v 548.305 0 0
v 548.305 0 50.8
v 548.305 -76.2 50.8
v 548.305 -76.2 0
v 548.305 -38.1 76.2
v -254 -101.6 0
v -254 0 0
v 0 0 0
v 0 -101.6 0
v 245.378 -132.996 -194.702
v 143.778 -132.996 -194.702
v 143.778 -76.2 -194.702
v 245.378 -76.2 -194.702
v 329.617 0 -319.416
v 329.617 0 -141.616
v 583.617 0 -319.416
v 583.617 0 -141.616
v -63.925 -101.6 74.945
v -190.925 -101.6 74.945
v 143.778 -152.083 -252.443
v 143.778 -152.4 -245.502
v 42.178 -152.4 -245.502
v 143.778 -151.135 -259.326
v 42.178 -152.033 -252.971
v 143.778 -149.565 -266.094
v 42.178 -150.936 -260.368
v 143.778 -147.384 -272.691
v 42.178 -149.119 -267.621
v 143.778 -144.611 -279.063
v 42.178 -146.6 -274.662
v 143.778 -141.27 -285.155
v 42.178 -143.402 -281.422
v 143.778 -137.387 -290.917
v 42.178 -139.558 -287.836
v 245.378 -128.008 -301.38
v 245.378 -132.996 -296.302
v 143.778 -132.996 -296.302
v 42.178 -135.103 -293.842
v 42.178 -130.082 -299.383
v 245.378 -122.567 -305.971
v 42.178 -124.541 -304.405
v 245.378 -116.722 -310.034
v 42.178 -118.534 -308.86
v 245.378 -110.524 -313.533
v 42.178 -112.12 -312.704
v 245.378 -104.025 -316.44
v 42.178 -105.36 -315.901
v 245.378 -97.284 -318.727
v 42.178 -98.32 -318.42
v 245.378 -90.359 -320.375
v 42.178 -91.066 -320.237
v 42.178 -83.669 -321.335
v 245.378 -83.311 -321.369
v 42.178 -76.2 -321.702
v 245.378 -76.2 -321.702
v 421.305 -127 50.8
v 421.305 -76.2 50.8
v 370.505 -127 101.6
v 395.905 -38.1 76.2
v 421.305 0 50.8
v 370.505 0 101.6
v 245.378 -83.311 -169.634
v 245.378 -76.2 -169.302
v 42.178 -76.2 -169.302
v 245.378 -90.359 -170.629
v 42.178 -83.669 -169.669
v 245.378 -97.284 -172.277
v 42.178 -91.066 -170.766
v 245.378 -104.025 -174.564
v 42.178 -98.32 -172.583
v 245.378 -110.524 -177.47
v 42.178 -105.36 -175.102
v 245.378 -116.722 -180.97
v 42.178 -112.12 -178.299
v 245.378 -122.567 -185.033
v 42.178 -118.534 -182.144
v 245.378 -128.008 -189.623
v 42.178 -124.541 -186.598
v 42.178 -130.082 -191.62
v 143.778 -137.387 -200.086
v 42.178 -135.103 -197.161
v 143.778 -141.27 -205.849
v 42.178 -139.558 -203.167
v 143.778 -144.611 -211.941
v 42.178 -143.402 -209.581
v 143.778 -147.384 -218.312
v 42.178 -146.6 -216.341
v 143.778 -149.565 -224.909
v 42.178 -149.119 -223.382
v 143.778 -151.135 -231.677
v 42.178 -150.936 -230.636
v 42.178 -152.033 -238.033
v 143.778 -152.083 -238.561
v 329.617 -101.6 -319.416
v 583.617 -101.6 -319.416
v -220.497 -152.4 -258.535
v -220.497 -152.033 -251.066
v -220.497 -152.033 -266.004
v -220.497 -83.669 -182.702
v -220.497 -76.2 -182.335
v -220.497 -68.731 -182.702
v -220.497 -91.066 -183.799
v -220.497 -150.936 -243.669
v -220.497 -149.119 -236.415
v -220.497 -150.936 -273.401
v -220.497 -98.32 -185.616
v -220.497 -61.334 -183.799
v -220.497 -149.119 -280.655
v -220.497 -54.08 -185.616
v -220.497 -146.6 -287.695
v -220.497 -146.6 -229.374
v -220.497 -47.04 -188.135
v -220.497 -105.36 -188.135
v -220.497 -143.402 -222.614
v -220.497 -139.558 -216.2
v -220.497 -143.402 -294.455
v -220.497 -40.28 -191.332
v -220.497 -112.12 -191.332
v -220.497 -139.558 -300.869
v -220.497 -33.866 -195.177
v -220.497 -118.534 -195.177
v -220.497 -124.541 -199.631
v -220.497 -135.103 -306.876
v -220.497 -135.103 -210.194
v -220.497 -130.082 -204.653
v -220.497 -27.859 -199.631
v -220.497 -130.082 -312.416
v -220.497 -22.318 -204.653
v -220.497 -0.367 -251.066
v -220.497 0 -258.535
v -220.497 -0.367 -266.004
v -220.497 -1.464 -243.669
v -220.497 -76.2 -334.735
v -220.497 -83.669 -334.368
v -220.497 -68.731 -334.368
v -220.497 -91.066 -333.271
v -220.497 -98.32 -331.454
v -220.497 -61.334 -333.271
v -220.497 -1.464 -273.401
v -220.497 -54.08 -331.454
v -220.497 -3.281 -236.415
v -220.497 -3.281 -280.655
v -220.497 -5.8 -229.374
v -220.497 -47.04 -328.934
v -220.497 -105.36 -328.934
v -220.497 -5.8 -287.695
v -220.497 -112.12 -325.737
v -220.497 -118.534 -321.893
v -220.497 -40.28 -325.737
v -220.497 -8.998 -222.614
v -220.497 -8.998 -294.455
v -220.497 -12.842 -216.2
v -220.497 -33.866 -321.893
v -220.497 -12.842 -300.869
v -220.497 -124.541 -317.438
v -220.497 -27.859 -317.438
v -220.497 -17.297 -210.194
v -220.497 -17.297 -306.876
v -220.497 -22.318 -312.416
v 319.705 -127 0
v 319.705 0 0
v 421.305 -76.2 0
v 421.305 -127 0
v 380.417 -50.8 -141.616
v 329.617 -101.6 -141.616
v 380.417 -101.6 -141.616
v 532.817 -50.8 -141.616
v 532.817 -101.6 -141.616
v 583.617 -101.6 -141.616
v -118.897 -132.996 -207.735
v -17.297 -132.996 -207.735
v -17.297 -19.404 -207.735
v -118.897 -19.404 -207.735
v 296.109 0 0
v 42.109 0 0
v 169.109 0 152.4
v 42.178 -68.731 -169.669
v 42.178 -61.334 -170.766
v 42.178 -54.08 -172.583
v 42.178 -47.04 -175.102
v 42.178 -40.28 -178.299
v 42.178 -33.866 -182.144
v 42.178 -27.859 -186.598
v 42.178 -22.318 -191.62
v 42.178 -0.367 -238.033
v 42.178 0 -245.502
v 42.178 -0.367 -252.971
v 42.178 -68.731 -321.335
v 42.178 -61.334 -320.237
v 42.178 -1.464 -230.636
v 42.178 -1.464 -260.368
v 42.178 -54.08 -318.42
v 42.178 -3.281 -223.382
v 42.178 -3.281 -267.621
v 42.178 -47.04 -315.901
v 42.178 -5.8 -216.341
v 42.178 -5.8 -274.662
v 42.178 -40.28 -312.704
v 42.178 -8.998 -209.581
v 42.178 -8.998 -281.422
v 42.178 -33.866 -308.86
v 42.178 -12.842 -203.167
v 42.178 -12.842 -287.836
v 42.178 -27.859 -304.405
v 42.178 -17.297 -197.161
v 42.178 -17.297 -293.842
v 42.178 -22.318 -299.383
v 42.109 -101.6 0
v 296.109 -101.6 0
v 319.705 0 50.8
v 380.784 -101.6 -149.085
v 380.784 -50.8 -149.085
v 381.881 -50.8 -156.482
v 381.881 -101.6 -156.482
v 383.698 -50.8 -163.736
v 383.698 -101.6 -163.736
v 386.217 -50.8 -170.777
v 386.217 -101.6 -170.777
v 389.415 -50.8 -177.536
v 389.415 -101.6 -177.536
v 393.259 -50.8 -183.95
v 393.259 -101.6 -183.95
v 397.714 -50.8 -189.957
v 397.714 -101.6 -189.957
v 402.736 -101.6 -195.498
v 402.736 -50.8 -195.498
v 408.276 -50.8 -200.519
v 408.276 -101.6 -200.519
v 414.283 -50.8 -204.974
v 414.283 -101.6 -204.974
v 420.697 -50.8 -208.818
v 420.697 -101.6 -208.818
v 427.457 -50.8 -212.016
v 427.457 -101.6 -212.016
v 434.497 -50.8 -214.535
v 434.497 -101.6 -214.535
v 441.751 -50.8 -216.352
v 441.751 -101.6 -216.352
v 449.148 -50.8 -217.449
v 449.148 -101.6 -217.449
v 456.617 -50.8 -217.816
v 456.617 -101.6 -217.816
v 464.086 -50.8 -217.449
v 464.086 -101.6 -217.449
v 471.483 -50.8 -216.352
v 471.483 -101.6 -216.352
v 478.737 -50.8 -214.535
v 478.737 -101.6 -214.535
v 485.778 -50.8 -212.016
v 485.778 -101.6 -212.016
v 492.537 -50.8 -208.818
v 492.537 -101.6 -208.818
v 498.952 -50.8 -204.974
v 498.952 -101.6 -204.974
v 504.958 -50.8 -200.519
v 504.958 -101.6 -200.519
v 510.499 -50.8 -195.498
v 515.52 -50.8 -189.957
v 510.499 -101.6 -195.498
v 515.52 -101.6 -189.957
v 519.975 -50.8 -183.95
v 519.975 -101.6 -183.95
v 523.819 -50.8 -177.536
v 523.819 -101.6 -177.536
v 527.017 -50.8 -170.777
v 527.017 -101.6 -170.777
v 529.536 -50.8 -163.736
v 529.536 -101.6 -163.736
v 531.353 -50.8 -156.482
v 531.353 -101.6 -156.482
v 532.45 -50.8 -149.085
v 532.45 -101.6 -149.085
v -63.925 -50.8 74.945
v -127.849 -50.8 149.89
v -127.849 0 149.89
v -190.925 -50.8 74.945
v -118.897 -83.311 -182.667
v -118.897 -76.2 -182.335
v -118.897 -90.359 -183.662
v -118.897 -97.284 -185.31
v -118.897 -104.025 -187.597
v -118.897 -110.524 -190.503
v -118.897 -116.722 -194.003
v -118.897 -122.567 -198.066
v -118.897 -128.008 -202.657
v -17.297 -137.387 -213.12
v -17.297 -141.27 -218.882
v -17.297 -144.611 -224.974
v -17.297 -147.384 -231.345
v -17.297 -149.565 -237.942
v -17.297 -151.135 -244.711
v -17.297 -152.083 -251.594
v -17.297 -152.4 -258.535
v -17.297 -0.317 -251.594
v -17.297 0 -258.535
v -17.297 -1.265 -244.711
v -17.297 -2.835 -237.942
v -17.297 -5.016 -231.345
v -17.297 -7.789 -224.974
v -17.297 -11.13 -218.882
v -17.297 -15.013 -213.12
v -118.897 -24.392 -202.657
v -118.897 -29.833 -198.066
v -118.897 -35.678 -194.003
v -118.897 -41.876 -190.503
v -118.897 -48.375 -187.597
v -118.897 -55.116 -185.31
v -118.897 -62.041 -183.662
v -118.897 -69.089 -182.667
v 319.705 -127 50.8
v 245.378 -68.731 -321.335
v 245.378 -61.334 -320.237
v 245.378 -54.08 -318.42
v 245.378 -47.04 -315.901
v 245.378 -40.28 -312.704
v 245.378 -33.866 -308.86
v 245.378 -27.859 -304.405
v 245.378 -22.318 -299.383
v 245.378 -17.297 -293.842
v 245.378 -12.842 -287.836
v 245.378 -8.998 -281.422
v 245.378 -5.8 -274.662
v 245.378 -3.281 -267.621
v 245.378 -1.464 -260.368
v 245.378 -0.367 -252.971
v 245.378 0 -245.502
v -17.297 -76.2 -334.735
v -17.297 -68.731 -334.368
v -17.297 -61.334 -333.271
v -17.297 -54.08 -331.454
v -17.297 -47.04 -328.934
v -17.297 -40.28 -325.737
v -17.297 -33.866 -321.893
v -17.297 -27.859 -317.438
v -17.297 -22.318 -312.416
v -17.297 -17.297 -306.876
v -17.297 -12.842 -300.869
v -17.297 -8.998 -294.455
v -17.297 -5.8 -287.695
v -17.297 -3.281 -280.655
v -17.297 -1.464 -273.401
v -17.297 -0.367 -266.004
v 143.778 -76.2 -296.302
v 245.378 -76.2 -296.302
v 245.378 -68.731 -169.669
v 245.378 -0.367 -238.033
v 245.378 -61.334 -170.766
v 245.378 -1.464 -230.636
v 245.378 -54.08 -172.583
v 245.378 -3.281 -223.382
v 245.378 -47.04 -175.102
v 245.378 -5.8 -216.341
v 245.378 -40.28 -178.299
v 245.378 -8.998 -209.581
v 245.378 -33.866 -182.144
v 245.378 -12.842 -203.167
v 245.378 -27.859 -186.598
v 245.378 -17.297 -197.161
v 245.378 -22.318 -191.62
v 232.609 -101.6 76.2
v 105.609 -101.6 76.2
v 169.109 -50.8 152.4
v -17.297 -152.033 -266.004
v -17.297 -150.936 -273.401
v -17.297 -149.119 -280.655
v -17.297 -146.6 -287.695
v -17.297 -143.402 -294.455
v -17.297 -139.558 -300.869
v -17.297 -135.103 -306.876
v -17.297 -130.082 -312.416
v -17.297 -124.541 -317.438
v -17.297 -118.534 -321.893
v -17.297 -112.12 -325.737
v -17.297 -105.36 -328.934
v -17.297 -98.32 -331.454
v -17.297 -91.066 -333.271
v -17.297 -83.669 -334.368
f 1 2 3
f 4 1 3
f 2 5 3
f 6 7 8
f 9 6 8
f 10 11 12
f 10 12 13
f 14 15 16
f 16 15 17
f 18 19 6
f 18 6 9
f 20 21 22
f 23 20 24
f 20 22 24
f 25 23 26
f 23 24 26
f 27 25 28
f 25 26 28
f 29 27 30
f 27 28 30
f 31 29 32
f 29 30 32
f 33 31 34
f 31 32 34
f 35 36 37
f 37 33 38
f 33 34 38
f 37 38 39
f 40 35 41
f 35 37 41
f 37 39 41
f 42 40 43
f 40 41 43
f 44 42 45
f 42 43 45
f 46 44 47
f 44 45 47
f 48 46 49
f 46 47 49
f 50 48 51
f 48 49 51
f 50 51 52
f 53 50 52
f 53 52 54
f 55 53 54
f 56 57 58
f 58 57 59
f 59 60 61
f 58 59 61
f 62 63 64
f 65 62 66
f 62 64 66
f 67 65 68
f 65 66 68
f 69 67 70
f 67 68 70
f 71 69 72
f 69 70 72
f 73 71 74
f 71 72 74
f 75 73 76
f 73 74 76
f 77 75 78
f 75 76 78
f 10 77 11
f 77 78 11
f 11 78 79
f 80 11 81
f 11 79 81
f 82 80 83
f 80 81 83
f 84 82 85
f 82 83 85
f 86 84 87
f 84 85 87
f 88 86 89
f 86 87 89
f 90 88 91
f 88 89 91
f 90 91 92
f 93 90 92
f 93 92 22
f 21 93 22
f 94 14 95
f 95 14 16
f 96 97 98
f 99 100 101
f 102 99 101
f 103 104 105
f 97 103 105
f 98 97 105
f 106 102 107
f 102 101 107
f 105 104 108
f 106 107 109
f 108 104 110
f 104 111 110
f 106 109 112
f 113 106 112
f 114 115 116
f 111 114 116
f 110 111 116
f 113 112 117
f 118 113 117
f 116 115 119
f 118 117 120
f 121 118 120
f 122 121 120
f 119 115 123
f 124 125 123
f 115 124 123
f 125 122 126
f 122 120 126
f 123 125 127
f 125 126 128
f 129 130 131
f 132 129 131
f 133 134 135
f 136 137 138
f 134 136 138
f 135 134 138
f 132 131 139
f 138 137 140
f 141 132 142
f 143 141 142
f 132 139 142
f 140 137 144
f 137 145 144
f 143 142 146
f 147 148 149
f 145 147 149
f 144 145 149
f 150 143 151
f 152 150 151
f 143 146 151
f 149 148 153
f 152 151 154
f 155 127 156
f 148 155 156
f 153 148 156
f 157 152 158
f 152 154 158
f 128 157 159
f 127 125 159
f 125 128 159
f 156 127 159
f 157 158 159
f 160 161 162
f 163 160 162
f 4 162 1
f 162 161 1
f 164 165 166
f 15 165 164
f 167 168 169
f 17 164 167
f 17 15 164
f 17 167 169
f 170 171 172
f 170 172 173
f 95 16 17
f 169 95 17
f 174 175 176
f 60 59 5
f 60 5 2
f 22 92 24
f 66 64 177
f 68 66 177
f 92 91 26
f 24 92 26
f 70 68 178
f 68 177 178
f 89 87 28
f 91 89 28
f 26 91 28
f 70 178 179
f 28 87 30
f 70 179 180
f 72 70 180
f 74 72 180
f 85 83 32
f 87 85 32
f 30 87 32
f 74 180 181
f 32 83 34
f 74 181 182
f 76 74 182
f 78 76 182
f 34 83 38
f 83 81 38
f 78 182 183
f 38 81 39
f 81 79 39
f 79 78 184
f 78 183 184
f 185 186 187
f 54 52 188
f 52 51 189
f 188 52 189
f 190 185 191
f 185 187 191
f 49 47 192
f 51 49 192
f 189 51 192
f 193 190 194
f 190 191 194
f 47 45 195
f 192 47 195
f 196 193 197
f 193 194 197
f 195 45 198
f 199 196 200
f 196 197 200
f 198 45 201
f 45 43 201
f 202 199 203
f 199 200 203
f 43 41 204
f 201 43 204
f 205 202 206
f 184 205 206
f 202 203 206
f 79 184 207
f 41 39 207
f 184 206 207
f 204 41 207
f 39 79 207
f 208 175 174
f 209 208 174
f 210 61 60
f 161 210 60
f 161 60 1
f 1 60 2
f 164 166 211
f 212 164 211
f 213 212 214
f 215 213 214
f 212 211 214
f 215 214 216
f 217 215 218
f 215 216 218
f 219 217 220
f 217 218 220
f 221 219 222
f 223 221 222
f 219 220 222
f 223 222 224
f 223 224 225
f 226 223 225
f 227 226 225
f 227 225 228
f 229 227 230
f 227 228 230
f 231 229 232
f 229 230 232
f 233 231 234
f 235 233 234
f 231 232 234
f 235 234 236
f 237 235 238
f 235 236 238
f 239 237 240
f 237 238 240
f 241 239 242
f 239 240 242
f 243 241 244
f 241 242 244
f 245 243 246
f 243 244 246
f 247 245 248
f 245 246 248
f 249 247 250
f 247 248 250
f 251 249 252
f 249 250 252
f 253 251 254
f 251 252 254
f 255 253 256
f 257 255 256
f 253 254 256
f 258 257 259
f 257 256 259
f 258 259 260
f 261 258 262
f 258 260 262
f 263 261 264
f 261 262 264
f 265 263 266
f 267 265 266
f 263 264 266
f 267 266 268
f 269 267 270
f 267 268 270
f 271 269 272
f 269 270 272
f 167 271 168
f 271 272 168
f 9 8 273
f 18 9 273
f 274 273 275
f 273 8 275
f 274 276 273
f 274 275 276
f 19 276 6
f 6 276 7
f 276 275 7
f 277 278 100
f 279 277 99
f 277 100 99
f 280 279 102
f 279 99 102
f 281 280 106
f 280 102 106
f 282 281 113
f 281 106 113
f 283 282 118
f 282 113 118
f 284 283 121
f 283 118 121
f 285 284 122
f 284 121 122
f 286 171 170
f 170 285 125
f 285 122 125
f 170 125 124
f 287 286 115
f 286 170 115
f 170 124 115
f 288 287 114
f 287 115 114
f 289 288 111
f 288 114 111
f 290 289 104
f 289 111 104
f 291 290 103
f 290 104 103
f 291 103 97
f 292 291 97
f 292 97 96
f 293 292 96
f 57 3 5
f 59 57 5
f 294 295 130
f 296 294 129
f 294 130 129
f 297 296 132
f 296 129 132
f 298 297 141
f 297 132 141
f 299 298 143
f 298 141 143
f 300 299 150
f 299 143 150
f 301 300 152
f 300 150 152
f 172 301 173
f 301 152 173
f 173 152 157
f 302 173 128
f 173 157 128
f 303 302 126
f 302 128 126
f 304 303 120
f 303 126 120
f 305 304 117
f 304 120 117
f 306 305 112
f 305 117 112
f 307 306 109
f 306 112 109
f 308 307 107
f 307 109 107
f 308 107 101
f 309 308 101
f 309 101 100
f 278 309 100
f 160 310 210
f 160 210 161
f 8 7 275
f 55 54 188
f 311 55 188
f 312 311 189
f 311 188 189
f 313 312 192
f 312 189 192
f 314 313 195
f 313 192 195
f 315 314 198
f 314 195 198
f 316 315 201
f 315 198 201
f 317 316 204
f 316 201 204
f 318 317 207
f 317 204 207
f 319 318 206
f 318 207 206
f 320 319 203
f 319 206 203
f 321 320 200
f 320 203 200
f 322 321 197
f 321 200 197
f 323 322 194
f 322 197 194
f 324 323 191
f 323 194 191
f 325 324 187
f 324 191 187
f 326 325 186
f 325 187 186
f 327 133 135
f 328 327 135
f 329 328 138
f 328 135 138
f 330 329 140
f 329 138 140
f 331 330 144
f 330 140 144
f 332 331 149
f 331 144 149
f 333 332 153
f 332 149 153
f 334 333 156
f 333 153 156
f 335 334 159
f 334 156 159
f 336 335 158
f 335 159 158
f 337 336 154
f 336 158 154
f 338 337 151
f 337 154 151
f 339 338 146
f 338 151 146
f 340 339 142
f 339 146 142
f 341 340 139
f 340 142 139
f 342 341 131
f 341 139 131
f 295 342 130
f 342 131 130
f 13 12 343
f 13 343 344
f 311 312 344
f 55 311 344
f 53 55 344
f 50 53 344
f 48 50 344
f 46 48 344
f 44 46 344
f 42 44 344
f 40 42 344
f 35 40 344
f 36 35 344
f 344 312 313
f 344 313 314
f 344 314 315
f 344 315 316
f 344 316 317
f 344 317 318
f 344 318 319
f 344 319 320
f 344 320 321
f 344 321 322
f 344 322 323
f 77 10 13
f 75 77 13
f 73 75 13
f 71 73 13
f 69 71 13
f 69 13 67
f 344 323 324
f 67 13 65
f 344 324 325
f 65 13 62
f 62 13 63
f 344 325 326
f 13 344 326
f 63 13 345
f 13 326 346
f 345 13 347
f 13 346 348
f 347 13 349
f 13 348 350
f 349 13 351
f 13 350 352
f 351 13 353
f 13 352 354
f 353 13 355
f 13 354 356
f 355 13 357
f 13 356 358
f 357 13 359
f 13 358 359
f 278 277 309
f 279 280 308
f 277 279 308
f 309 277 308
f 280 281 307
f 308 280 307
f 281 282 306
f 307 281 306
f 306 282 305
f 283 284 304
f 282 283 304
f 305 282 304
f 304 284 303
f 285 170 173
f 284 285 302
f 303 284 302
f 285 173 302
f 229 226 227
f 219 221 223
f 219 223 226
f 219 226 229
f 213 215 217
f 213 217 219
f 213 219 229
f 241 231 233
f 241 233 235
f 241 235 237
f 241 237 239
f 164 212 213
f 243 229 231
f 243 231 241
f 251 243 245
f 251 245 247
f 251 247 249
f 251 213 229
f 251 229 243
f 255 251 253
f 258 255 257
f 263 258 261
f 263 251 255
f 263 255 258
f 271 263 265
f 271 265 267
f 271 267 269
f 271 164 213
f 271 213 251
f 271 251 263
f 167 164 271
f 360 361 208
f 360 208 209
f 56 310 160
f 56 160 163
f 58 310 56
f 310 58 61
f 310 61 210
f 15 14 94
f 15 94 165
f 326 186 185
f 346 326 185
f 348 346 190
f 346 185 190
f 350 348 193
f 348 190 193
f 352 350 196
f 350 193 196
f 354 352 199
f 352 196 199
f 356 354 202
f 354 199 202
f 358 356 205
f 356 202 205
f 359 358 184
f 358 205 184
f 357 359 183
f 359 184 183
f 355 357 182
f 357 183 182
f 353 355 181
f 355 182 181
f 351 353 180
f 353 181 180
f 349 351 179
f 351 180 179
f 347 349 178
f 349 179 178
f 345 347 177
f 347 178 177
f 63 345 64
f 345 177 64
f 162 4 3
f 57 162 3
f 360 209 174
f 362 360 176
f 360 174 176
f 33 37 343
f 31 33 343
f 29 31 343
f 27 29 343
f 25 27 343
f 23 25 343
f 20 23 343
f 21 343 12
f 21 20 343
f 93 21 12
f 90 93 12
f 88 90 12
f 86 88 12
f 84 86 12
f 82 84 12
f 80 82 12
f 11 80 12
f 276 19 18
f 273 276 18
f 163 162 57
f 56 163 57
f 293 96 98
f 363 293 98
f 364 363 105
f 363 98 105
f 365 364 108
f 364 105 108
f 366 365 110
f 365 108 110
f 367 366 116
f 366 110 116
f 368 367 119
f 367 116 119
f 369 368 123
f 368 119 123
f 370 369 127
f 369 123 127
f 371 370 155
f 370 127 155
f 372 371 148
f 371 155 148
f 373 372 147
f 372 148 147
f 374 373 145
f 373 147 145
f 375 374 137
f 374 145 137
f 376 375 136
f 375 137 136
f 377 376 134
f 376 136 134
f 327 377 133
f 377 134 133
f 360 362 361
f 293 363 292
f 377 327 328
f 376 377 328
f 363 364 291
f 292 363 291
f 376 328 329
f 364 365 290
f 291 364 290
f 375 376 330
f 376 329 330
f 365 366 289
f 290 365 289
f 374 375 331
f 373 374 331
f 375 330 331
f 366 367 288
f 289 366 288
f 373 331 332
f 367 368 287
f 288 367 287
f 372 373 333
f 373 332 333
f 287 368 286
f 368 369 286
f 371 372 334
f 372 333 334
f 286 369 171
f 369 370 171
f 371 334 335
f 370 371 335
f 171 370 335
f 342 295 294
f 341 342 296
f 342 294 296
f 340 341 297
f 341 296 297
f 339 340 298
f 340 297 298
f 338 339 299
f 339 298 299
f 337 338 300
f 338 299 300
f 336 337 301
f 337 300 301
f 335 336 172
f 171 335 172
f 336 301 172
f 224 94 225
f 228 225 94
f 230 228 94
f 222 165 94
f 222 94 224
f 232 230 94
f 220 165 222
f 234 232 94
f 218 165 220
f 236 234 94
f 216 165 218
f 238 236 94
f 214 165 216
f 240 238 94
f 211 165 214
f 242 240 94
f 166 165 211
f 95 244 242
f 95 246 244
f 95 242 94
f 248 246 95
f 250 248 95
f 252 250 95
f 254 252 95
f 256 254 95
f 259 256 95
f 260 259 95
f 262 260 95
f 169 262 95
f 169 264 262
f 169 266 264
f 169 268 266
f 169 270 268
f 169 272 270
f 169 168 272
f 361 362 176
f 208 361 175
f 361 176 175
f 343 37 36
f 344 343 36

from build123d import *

# Parameters (mm, degrees)
F1_DEPTH  = 101.6
F3_DEPTH  = 50.8
F5_DEPTH  = 101.6
F9_DEPTH  = 78.74
F11_DEPTH = 127
F15_DEPTH = 177.8
F17_DEPTH = 152.4
F19_DEPTH = 239.776
F20_W     = 101.6
F20_H     = 101.6
F21_DEPTH = 152.4
F22_W     = 101.6
F22_H     = 101.6
F23_DEPTH = 76.2
F25_DEPTH = 344.17
F26_W     = 254
F26_H     = 177.8
F27_DEPTH = 101.6
F29_DEPTH = 50.8


with BuildPart() as f1:
    # F0 (on Front) → F1 (new body)
    with BuildSketch(Plane.XZ):
        Polygon((-254, 0), (-127, 0), (-127, 76.2), (-189.8684257342, 76.2), align=None)
        Polygon((-127, 0), (0, 0), (-64.9948852758, 76.2), (-127, 76.2), align=None)
        Polygon((-127, 76.2), (-64.9948852758, 76.2), (-127.8490939708, 149.8902708919), (-189.8684257342, 76.2), align=None)
    extrude(amount=F1_DEPTH)

    # F2 (on face) → F3 (cut)
    with BuildSketch(Plane.XZ.offset(101.6)):
        Polygon((-190.9245469854, 74.945135446), (-127, 74.945135446), (-63.9245469854, 74.945135446), (-127.8490939708, 149.8902708919), align=None)
    extrude(amount=-F3_DEPTH, mode=Mode.SUBTRACT)


with BuildPart() as f5:
    # F4 (on Front) → F5 (new body)
    with BuildSketch(Plane.XZ):
        Polygon((105.6093358387, 76.2), (42.1093358387, 0), (296.1093358387, 0), (232.6093358387, 76.2), (169.1093358387, 76.2), align=None)
        Polygon((169.1093358387, 152.4), (105.6093358387, 76.2), (169.1093358387, 76.2), (232.6093358387, 76.2), align=None)
    extrude(amount=F5_DEPTH)

    # F8 (on 3pt) → F9 (cut, symmetric)
    with BuildSketch(Plane(origin=(169.1093358387, 0, 0), x_dir=(0, -1, 0), z_dir=(-1, 0, 0))):
        Polygon((50.8, 152.4), (101.6, 76.2), (101.6, 152.4), align=None)
    extrude(amount=F9_DEPTH, both=True, mode=Mode.SUBTRACT)


with BuildPart() as f11:
    # F10 (on Front) → F11 (new body)
    with BuildSketch(Plane.XZ):
        Polygon((319.7051088319, 50.8), (319.7051088319, 0), (421.3051088319, 0), (421.3051088319, 50.8), (370.5051088319, 101.6), align=None)
    extrude(amount=F11_DEPTH)

    # F14 (on 3pt) → F15 (join)
    with BuildSketch(Plane(origin=(370.5051088319, 0, 0), x_dir=(0, -1, 0), z_dir=(-1, 0, 0))):
        Polygon((0, 50.8), (0, 0), (76.2, 0), (76.2, 50.8), (38.1, 76.2), align=None)
    extrude(amount=-F15_DEPTH)


with BuildPart() as f17:
    # F16 (on Front) → F17 (new body)
    with BuildSketch(Plane.XZ):
        Polygon((-118.8965989277, -182.334871027), (-220.4965989277, -182.334871027), (-220.4965989277, -334.734871027), (-17.2965989277, -334.734871027), (-17.2965989277, -207.734871027), (-118.8965989277, -207.734871027), align=None)
    extrude(amount=F17_DEPTH)

    # F18 (on face) → F19 (cut)
    with BuildSketch(Plane(origin=(-220.4965989277, 0, 0), x_dir=(0, -1, 0), z_dir=(-1, 0, 0))):
        with BuildLine():
            ThreePointArc((76.2, -182.334871027), (130.0815367264, -204.6533343006), (152.4, -258.534871027))
            Line((152.4, -258.534871027), (152.4, -182.334871027))
            Line((152.4, -182.334871027), (76.2, -182.334871027))
        make_face()
        with BuildLine():
            Line((152.4, -334.734871027), (152.4, -258.534871027))
            ThreePointArc((152.4, -258.534871027), (130.0815367264, -312.4164077534), (76.2, -334.734871027))
            Line((76.2, -334.734871027), (152.4, -334.734871027))
        make_face()
        with BuildLine():
            Line((0, -334.734871027), (76.2, -334.734871027))
            ThreePointArc((76.2, -334.734871027), (22.3184632736, -312.4164077534), (0, -258.534871027))
            Line((0, -258.534871027), (0, -334.734871027))
        make_face()
        with BuildLine():
            ThreePointArc((0, -258.534871027), (22.3184632736, -204.6533343006), (76.2, -182.334871027))
            Line((76.2, -182.334871027), (0, -182.334871027))
            Line((0, -182.334871027), (0, -258.534871027))
        make_face()
    extrude(amount=-F19_DEPTH, mode=Mode.SUBTRACT)


with BuildPart() as f21:
    # F20 (on Front) → F21 (new body)
    with BuildSketch(Plane.XZ):
        Polygon((42.1777254931, -169.3016177211), (42.1777254931, -321.7016177211), (245.3777254931, -321.7016177211), (245.3777254931, -296.3016177211), (143.7777254931, -296.3016177211), (143.7777254931, -194.7016177211), (245.3777254931, -194.7016177211), (245.3777254931, -169.3016177211), align=None)
        with Locations((194.5777254931, -245.5016177211)):
            Rectangle(F20_W, F20_H)
    extrude(amount=F21_DEPTH)

    # F22 (on face) → F23 (cut)
    with BuildSketch(Plane.XZ.offset(152.4)):
        with Locations((194.5777254931, -245.5016177211)):
            Rectangle(F22_W, F22_H)
    extrude(amount=-F23_DEPTH, mode=Mode.SUBTRACT)

    # F24 (on face) → F25 (cut)
    with BuildSketch(Plane(origin=(42.1777254931, 0, 0), x_dir=(0, -1, 0), z_dir=(-1, 0, 0))):
        with BuildLine():
            ThreePointArc((76.2, -169.3016177211), (130.0815367264, -191.6200809947), (152.4, -245.5016177211))
            Line((152.4, -245.5016177211), (152.4, -169.3016177211))
            Line((152.4, -169.3016177211), (76.2, -169.3016177211))
        make_face()
        with BuildLine():
            ThreePointArc((0, -245.5016177211), (22.3184632736, -191.6200809947), (76.2, -169.3016177211))
            Line((76.2, -169.3016177211), (0, -169.3016177211))
            Line((0, -169.3016177211), (0, -245.5016177211))
        make_face()
        with BuildLine():
            Line((152.4, -321.7016177211), (152.4, -245.5016177211))
            ThreePointArc((152.4, -245.5016177211), (130.0815367264, -299.3831544475), (76.2, -321.7016177211))
            Line((76.2, -321.7016177211), (152.4, -321.7016177211))
        make_face()
        with BuildLine():
            Line((0, -321.7016177211), (76.2, -321.7016177211))
            ThreePointArc((76.2, -321.7016177211), (22.3184632736, -299.3831544475), (0, -245.5016177211))
            Line((0, -245.5016177211), (0, -321.7016177211))
        make_face()
    extrude(amount=-F25_DEPTH, mode=Mode.SUBTRACT)


with BuildPart() as f27:
    # F26 (on Front) → F27 (new body)
    with BuildSketch(Plane.XZ):
        with Locations((456.6170573235, -230.5160389135)):
            Rectangle(F26_W, F26_H)
    extrude(amount=F27_DEPTH)

    # F28 (on face) → F29 (cut)
    with BuildSketch(Plane.XZ.offset(101.6)):
        with BuildLine():
            ThreePointArc((380.4170573235, -141.6160389135), (456.6170573235, -217.8160389135), (532.8170573235, -141.6160389135))
            Line((532.8170573235, -141.6160389135), (380.4170573235, -141.6160389135))
        make_face()
    extrude(amount=-F29_DEPTH, mode=Mode.SUBTRACT)


solid = Compound([f1.part, f5.part, f11.part, f17.part, f21.part, f27.part])
